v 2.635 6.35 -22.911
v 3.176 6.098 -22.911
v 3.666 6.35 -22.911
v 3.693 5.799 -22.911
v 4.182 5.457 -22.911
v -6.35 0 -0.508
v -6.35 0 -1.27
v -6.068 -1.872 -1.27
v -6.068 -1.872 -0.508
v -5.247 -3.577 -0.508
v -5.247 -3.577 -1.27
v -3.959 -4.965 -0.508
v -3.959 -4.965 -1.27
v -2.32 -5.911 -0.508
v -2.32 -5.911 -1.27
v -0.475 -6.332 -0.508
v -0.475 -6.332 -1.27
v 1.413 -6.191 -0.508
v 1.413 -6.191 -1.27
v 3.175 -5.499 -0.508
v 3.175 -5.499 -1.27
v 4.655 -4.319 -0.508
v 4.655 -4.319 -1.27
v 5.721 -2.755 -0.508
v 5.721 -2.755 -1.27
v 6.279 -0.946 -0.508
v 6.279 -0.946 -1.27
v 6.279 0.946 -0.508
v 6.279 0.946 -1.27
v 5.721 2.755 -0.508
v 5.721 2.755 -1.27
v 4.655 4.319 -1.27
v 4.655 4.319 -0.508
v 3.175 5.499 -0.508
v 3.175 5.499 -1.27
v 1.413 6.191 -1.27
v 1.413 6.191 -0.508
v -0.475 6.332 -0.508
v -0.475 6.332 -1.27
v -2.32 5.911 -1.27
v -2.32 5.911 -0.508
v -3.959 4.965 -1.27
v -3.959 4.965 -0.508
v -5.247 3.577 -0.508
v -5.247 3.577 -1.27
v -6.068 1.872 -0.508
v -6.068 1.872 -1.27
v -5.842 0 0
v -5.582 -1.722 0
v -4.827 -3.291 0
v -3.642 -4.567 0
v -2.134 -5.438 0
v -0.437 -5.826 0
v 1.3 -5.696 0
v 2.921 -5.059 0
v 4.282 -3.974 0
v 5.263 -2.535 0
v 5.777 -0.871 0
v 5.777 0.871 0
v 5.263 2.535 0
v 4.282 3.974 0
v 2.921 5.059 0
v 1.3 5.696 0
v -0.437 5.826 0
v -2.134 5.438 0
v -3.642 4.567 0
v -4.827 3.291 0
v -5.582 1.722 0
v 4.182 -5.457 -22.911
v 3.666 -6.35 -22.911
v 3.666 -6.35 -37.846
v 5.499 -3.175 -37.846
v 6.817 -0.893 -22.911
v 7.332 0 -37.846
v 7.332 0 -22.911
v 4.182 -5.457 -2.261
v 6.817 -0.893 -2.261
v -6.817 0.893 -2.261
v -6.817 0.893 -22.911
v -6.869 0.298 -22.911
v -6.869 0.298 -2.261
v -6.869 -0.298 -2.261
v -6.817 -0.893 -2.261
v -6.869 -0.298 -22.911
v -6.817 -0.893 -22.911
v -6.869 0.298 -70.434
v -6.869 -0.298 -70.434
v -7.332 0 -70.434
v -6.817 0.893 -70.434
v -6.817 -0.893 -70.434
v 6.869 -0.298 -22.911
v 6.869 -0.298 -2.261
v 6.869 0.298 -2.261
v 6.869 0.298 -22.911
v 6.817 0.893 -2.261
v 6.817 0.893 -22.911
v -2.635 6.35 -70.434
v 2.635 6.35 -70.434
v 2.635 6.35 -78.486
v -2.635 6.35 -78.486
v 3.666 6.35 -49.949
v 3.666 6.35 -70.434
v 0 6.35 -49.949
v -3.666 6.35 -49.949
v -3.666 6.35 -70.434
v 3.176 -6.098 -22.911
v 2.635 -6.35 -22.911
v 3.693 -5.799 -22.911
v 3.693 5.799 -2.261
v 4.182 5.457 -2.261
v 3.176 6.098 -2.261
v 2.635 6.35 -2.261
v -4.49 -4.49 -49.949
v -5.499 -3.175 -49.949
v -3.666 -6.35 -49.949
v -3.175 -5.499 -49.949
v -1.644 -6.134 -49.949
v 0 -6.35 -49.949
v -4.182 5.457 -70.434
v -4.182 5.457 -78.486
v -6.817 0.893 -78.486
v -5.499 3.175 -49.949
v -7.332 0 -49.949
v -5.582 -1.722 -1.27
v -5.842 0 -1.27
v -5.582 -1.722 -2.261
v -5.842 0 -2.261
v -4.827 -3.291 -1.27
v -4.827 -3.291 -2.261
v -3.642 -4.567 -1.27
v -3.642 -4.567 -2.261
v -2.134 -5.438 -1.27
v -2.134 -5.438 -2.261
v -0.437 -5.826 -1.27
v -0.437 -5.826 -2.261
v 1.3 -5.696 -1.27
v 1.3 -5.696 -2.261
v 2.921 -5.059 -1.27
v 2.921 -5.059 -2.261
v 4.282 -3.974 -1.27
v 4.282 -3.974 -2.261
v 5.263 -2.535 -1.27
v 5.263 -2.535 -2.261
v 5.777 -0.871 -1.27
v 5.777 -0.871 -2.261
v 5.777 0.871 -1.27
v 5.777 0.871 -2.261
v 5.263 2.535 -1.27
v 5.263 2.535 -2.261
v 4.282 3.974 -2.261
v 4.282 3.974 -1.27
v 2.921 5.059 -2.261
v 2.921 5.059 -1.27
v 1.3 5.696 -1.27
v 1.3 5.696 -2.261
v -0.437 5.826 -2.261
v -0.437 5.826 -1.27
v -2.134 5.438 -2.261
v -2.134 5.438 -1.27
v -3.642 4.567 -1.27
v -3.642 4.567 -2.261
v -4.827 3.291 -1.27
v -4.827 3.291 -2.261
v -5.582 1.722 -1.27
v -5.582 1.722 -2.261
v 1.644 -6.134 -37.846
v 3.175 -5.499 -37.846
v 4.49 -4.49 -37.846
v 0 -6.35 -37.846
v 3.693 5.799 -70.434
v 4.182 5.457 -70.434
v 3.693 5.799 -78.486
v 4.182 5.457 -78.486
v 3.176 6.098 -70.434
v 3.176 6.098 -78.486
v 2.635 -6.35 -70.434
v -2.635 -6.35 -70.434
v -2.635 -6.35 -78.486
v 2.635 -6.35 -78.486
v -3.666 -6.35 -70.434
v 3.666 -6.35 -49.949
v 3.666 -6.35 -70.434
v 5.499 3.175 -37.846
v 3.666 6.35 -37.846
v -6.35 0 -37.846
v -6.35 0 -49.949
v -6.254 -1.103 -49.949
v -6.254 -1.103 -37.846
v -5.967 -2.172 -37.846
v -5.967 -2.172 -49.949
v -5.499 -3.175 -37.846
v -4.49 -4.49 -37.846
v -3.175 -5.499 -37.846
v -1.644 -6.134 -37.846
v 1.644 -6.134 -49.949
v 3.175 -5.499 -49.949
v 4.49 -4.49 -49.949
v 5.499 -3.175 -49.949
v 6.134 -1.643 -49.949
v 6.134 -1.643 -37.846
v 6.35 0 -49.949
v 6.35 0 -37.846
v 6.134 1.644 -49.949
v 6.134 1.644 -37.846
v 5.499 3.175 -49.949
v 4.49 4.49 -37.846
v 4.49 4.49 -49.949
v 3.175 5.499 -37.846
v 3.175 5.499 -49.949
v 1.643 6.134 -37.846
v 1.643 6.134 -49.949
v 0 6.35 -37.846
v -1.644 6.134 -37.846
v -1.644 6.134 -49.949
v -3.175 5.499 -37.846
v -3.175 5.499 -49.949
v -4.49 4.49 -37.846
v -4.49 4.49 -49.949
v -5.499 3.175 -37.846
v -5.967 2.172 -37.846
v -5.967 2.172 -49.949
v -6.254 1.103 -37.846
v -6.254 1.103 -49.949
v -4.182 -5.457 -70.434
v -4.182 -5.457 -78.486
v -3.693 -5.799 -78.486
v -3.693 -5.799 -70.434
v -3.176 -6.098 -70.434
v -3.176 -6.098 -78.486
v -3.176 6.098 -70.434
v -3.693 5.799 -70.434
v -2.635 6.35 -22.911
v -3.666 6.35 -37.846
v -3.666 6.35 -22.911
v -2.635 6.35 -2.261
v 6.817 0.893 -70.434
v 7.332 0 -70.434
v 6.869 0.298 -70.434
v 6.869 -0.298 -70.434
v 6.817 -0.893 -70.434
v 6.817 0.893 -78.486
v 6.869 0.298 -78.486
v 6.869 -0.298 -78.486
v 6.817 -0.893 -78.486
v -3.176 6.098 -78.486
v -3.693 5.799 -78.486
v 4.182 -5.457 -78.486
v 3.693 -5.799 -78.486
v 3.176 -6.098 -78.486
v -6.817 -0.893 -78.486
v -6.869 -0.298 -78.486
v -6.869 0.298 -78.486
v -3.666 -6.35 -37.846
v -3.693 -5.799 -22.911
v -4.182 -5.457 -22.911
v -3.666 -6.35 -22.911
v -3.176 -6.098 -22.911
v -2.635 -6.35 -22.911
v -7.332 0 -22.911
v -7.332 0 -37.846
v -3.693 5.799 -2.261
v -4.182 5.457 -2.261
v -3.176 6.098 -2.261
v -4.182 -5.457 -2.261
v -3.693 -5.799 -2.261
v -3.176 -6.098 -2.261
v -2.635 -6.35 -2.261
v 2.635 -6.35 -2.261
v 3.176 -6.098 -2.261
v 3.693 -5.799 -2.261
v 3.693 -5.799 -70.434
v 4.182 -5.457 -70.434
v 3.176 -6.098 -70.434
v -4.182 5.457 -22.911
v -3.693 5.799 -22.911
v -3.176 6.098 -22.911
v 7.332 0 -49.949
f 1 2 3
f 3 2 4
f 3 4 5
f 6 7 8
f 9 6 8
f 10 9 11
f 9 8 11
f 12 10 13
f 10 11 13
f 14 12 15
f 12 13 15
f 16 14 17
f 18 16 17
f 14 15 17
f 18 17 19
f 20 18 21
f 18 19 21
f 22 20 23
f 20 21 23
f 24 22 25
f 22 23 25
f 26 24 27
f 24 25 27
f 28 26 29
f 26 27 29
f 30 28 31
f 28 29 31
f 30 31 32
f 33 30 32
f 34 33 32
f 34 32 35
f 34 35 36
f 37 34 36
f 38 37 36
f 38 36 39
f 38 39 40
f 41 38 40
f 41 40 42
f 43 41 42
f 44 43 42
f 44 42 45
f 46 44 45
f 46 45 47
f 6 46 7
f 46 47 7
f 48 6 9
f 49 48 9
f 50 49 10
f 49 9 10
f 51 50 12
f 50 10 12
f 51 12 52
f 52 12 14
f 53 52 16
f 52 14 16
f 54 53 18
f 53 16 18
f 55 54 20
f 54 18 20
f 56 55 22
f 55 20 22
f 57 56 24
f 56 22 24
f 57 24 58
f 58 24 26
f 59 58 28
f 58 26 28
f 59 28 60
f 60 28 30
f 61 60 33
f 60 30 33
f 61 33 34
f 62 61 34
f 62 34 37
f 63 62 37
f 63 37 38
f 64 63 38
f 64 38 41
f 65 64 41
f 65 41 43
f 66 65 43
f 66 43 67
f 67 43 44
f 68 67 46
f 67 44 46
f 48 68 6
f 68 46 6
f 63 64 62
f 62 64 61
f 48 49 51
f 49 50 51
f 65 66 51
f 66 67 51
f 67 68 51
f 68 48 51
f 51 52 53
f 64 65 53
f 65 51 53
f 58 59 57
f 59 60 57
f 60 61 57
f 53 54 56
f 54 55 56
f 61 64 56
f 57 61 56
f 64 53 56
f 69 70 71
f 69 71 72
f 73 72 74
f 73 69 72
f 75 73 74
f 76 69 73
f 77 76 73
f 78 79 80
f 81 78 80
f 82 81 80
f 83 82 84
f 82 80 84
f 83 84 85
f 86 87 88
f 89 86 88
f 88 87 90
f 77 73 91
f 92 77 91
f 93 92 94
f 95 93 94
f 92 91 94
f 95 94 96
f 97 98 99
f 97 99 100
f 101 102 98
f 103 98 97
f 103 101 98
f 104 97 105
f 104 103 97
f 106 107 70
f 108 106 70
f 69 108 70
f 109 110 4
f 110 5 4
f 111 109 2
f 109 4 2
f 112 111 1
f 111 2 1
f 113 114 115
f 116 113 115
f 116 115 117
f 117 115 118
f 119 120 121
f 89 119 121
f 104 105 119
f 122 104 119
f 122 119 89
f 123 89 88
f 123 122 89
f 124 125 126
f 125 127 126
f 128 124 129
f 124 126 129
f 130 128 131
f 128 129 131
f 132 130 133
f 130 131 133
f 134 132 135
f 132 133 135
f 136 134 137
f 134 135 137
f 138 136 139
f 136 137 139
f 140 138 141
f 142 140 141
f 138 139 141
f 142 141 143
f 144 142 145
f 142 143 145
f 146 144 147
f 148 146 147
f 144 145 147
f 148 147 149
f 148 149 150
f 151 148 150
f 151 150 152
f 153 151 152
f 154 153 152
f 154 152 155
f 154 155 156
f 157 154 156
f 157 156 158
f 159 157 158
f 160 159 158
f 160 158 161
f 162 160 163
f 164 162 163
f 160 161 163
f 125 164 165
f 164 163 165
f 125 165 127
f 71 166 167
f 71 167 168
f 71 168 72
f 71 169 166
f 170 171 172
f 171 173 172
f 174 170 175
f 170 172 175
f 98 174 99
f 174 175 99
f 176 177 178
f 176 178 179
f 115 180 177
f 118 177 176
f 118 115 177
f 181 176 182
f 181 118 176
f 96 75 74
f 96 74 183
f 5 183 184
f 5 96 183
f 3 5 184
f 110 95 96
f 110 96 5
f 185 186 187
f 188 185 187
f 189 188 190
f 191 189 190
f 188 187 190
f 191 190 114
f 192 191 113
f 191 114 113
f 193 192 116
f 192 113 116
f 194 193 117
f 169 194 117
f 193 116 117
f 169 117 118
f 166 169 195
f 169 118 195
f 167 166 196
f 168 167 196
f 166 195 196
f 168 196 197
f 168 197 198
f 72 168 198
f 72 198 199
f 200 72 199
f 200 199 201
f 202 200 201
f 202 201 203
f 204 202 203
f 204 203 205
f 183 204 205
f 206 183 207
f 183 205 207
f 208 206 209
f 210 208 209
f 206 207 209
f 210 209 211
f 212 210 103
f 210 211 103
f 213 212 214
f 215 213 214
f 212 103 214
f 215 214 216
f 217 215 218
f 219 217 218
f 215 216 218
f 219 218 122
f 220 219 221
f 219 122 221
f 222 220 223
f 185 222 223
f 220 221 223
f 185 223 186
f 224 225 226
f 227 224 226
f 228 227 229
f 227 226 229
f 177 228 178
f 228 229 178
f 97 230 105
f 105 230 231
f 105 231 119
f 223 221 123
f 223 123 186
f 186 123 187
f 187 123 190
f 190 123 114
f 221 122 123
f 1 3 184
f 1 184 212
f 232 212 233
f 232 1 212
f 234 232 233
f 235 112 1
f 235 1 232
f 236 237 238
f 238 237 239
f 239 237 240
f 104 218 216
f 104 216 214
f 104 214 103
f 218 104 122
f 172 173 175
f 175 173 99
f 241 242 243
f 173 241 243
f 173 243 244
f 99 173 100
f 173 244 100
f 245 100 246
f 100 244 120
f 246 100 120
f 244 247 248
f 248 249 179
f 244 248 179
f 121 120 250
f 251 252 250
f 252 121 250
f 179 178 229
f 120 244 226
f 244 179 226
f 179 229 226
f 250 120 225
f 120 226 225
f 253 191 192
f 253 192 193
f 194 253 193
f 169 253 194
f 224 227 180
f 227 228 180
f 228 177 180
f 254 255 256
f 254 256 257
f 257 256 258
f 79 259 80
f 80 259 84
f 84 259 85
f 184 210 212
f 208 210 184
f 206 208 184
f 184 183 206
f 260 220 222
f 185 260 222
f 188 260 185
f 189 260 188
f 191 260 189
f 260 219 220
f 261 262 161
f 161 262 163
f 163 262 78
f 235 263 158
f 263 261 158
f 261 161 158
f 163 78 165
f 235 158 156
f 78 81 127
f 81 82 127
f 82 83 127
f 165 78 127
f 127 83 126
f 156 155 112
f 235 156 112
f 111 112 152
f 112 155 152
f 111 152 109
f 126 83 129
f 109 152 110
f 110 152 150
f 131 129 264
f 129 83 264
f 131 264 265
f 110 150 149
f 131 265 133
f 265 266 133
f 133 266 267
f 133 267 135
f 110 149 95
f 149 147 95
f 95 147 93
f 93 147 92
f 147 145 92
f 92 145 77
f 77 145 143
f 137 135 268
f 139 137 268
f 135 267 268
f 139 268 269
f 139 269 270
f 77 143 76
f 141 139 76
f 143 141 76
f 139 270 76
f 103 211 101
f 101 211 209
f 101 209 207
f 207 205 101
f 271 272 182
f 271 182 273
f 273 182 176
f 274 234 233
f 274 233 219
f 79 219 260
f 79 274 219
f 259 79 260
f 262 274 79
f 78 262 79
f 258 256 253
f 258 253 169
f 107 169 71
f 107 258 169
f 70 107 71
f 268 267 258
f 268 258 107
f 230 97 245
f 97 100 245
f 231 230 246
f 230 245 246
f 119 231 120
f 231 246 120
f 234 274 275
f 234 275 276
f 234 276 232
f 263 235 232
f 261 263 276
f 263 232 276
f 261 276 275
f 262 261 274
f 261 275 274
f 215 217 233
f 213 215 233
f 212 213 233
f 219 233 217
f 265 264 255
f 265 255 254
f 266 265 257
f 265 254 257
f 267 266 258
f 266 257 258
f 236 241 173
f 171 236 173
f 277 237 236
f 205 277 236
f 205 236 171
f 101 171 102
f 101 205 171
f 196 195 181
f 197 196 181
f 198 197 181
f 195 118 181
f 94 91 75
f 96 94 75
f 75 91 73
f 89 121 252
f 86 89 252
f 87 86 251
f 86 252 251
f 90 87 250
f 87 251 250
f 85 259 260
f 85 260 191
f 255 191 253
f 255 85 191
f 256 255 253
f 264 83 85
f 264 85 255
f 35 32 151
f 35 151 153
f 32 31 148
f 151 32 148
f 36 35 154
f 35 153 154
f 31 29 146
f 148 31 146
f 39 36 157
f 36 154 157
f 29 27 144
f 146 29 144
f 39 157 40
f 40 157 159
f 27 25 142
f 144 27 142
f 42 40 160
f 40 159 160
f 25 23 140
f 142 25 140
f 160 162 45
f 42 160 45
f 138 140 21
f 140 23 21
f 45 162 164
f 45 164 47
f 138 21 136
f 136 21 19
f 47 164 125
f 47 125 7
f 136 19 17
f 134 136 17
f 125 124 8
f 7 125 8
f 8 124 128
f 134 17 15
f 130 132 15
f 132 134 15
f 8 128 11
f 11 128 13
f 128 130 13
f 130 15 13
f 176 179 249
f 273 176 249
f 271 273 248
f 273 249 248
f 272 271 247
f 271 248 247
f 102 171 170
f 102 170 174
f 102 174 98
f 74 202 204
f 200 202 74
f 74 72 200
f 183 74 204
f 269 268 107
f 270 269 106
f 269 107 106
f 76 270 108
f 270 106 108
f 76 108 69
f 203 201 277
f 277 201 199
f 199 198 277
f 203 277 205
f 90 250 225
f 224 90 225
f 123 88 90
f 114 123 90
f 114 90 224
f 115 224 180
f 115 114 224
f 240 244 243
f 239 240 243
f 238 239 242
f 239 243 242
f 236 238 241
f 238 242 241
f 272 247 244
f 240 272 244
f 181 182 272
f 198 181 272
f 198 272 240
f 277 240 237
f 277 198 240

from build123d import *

# Parameters (mm, degrees)
SKETCH2_OUTSIDE_W  = 34.202
SKETCH2_OUTSIDE_H  = 34.202
CUT_EXTRUDE1_DEPTH = 78.047514026
CHAMFER1_SIZE      = 0.508


with BuildPart() as part:
    # Sketch1 → Revolve1 (revolve)
    with BuildSketch(Plane(origin=(0, 0, 0), x_dir=(0, 0, -1), z_dir=(1, 0, 0)), mode=Mode.PRIVATE) as revolve1_sk:
        Polygon((0, 0), (0, 6.35), (1.27, 6.35), (1.27, 5.842), (2.2606, 5.842), (2.2606, 6.875), (22.9108, 6.875), (22.9108, 7.9375), (37.846, 7.9375), (37.846, 6.875), (37.846, 6.35), (49.9491, 6.35), (49.9491, 7.9375), (70.4342, 7.9375), (70.4342, 6.875), (78.486, 6.875), (78.486, 0), align=None)
    revolve(revolve1_sk.sketch.rotate(Axis((0, 0, 0), (0, 0, 1)), 90), axis=Axis((0, 0, 0), (0, 0, 1)))

    # Sketch2 outside → Cut-Extrude1 (cut, through all)
    with BuildSketch(Plane.XY.offset(-2.2606)):
        Rectangle(SKETCH2_OUTSIDE_W, SKETCH2_OUTSIDE_H)
        Polygon((3.666174209, 6.35), (-3.666174209, 6.35), (-7.332348419, 0), (-3.666174209, -6.35), (3.666174209, -6.35), (7.332348419, 0), align=None, mode=Mode.SUBTRACT)
    extrude(amount=-CUT_EXTRUDE1_DEPTH, mode=Mode.SUBTRACT)

    # Chamfer1
    chamfer1_edges = [part.edges().sort_by_distance(p)[0] for p in [
        (6.35, 0, 0),
    ]]
    chamfer(chamfer1_edges, length=CHAMFER1_SIZE)


solid = part.part
